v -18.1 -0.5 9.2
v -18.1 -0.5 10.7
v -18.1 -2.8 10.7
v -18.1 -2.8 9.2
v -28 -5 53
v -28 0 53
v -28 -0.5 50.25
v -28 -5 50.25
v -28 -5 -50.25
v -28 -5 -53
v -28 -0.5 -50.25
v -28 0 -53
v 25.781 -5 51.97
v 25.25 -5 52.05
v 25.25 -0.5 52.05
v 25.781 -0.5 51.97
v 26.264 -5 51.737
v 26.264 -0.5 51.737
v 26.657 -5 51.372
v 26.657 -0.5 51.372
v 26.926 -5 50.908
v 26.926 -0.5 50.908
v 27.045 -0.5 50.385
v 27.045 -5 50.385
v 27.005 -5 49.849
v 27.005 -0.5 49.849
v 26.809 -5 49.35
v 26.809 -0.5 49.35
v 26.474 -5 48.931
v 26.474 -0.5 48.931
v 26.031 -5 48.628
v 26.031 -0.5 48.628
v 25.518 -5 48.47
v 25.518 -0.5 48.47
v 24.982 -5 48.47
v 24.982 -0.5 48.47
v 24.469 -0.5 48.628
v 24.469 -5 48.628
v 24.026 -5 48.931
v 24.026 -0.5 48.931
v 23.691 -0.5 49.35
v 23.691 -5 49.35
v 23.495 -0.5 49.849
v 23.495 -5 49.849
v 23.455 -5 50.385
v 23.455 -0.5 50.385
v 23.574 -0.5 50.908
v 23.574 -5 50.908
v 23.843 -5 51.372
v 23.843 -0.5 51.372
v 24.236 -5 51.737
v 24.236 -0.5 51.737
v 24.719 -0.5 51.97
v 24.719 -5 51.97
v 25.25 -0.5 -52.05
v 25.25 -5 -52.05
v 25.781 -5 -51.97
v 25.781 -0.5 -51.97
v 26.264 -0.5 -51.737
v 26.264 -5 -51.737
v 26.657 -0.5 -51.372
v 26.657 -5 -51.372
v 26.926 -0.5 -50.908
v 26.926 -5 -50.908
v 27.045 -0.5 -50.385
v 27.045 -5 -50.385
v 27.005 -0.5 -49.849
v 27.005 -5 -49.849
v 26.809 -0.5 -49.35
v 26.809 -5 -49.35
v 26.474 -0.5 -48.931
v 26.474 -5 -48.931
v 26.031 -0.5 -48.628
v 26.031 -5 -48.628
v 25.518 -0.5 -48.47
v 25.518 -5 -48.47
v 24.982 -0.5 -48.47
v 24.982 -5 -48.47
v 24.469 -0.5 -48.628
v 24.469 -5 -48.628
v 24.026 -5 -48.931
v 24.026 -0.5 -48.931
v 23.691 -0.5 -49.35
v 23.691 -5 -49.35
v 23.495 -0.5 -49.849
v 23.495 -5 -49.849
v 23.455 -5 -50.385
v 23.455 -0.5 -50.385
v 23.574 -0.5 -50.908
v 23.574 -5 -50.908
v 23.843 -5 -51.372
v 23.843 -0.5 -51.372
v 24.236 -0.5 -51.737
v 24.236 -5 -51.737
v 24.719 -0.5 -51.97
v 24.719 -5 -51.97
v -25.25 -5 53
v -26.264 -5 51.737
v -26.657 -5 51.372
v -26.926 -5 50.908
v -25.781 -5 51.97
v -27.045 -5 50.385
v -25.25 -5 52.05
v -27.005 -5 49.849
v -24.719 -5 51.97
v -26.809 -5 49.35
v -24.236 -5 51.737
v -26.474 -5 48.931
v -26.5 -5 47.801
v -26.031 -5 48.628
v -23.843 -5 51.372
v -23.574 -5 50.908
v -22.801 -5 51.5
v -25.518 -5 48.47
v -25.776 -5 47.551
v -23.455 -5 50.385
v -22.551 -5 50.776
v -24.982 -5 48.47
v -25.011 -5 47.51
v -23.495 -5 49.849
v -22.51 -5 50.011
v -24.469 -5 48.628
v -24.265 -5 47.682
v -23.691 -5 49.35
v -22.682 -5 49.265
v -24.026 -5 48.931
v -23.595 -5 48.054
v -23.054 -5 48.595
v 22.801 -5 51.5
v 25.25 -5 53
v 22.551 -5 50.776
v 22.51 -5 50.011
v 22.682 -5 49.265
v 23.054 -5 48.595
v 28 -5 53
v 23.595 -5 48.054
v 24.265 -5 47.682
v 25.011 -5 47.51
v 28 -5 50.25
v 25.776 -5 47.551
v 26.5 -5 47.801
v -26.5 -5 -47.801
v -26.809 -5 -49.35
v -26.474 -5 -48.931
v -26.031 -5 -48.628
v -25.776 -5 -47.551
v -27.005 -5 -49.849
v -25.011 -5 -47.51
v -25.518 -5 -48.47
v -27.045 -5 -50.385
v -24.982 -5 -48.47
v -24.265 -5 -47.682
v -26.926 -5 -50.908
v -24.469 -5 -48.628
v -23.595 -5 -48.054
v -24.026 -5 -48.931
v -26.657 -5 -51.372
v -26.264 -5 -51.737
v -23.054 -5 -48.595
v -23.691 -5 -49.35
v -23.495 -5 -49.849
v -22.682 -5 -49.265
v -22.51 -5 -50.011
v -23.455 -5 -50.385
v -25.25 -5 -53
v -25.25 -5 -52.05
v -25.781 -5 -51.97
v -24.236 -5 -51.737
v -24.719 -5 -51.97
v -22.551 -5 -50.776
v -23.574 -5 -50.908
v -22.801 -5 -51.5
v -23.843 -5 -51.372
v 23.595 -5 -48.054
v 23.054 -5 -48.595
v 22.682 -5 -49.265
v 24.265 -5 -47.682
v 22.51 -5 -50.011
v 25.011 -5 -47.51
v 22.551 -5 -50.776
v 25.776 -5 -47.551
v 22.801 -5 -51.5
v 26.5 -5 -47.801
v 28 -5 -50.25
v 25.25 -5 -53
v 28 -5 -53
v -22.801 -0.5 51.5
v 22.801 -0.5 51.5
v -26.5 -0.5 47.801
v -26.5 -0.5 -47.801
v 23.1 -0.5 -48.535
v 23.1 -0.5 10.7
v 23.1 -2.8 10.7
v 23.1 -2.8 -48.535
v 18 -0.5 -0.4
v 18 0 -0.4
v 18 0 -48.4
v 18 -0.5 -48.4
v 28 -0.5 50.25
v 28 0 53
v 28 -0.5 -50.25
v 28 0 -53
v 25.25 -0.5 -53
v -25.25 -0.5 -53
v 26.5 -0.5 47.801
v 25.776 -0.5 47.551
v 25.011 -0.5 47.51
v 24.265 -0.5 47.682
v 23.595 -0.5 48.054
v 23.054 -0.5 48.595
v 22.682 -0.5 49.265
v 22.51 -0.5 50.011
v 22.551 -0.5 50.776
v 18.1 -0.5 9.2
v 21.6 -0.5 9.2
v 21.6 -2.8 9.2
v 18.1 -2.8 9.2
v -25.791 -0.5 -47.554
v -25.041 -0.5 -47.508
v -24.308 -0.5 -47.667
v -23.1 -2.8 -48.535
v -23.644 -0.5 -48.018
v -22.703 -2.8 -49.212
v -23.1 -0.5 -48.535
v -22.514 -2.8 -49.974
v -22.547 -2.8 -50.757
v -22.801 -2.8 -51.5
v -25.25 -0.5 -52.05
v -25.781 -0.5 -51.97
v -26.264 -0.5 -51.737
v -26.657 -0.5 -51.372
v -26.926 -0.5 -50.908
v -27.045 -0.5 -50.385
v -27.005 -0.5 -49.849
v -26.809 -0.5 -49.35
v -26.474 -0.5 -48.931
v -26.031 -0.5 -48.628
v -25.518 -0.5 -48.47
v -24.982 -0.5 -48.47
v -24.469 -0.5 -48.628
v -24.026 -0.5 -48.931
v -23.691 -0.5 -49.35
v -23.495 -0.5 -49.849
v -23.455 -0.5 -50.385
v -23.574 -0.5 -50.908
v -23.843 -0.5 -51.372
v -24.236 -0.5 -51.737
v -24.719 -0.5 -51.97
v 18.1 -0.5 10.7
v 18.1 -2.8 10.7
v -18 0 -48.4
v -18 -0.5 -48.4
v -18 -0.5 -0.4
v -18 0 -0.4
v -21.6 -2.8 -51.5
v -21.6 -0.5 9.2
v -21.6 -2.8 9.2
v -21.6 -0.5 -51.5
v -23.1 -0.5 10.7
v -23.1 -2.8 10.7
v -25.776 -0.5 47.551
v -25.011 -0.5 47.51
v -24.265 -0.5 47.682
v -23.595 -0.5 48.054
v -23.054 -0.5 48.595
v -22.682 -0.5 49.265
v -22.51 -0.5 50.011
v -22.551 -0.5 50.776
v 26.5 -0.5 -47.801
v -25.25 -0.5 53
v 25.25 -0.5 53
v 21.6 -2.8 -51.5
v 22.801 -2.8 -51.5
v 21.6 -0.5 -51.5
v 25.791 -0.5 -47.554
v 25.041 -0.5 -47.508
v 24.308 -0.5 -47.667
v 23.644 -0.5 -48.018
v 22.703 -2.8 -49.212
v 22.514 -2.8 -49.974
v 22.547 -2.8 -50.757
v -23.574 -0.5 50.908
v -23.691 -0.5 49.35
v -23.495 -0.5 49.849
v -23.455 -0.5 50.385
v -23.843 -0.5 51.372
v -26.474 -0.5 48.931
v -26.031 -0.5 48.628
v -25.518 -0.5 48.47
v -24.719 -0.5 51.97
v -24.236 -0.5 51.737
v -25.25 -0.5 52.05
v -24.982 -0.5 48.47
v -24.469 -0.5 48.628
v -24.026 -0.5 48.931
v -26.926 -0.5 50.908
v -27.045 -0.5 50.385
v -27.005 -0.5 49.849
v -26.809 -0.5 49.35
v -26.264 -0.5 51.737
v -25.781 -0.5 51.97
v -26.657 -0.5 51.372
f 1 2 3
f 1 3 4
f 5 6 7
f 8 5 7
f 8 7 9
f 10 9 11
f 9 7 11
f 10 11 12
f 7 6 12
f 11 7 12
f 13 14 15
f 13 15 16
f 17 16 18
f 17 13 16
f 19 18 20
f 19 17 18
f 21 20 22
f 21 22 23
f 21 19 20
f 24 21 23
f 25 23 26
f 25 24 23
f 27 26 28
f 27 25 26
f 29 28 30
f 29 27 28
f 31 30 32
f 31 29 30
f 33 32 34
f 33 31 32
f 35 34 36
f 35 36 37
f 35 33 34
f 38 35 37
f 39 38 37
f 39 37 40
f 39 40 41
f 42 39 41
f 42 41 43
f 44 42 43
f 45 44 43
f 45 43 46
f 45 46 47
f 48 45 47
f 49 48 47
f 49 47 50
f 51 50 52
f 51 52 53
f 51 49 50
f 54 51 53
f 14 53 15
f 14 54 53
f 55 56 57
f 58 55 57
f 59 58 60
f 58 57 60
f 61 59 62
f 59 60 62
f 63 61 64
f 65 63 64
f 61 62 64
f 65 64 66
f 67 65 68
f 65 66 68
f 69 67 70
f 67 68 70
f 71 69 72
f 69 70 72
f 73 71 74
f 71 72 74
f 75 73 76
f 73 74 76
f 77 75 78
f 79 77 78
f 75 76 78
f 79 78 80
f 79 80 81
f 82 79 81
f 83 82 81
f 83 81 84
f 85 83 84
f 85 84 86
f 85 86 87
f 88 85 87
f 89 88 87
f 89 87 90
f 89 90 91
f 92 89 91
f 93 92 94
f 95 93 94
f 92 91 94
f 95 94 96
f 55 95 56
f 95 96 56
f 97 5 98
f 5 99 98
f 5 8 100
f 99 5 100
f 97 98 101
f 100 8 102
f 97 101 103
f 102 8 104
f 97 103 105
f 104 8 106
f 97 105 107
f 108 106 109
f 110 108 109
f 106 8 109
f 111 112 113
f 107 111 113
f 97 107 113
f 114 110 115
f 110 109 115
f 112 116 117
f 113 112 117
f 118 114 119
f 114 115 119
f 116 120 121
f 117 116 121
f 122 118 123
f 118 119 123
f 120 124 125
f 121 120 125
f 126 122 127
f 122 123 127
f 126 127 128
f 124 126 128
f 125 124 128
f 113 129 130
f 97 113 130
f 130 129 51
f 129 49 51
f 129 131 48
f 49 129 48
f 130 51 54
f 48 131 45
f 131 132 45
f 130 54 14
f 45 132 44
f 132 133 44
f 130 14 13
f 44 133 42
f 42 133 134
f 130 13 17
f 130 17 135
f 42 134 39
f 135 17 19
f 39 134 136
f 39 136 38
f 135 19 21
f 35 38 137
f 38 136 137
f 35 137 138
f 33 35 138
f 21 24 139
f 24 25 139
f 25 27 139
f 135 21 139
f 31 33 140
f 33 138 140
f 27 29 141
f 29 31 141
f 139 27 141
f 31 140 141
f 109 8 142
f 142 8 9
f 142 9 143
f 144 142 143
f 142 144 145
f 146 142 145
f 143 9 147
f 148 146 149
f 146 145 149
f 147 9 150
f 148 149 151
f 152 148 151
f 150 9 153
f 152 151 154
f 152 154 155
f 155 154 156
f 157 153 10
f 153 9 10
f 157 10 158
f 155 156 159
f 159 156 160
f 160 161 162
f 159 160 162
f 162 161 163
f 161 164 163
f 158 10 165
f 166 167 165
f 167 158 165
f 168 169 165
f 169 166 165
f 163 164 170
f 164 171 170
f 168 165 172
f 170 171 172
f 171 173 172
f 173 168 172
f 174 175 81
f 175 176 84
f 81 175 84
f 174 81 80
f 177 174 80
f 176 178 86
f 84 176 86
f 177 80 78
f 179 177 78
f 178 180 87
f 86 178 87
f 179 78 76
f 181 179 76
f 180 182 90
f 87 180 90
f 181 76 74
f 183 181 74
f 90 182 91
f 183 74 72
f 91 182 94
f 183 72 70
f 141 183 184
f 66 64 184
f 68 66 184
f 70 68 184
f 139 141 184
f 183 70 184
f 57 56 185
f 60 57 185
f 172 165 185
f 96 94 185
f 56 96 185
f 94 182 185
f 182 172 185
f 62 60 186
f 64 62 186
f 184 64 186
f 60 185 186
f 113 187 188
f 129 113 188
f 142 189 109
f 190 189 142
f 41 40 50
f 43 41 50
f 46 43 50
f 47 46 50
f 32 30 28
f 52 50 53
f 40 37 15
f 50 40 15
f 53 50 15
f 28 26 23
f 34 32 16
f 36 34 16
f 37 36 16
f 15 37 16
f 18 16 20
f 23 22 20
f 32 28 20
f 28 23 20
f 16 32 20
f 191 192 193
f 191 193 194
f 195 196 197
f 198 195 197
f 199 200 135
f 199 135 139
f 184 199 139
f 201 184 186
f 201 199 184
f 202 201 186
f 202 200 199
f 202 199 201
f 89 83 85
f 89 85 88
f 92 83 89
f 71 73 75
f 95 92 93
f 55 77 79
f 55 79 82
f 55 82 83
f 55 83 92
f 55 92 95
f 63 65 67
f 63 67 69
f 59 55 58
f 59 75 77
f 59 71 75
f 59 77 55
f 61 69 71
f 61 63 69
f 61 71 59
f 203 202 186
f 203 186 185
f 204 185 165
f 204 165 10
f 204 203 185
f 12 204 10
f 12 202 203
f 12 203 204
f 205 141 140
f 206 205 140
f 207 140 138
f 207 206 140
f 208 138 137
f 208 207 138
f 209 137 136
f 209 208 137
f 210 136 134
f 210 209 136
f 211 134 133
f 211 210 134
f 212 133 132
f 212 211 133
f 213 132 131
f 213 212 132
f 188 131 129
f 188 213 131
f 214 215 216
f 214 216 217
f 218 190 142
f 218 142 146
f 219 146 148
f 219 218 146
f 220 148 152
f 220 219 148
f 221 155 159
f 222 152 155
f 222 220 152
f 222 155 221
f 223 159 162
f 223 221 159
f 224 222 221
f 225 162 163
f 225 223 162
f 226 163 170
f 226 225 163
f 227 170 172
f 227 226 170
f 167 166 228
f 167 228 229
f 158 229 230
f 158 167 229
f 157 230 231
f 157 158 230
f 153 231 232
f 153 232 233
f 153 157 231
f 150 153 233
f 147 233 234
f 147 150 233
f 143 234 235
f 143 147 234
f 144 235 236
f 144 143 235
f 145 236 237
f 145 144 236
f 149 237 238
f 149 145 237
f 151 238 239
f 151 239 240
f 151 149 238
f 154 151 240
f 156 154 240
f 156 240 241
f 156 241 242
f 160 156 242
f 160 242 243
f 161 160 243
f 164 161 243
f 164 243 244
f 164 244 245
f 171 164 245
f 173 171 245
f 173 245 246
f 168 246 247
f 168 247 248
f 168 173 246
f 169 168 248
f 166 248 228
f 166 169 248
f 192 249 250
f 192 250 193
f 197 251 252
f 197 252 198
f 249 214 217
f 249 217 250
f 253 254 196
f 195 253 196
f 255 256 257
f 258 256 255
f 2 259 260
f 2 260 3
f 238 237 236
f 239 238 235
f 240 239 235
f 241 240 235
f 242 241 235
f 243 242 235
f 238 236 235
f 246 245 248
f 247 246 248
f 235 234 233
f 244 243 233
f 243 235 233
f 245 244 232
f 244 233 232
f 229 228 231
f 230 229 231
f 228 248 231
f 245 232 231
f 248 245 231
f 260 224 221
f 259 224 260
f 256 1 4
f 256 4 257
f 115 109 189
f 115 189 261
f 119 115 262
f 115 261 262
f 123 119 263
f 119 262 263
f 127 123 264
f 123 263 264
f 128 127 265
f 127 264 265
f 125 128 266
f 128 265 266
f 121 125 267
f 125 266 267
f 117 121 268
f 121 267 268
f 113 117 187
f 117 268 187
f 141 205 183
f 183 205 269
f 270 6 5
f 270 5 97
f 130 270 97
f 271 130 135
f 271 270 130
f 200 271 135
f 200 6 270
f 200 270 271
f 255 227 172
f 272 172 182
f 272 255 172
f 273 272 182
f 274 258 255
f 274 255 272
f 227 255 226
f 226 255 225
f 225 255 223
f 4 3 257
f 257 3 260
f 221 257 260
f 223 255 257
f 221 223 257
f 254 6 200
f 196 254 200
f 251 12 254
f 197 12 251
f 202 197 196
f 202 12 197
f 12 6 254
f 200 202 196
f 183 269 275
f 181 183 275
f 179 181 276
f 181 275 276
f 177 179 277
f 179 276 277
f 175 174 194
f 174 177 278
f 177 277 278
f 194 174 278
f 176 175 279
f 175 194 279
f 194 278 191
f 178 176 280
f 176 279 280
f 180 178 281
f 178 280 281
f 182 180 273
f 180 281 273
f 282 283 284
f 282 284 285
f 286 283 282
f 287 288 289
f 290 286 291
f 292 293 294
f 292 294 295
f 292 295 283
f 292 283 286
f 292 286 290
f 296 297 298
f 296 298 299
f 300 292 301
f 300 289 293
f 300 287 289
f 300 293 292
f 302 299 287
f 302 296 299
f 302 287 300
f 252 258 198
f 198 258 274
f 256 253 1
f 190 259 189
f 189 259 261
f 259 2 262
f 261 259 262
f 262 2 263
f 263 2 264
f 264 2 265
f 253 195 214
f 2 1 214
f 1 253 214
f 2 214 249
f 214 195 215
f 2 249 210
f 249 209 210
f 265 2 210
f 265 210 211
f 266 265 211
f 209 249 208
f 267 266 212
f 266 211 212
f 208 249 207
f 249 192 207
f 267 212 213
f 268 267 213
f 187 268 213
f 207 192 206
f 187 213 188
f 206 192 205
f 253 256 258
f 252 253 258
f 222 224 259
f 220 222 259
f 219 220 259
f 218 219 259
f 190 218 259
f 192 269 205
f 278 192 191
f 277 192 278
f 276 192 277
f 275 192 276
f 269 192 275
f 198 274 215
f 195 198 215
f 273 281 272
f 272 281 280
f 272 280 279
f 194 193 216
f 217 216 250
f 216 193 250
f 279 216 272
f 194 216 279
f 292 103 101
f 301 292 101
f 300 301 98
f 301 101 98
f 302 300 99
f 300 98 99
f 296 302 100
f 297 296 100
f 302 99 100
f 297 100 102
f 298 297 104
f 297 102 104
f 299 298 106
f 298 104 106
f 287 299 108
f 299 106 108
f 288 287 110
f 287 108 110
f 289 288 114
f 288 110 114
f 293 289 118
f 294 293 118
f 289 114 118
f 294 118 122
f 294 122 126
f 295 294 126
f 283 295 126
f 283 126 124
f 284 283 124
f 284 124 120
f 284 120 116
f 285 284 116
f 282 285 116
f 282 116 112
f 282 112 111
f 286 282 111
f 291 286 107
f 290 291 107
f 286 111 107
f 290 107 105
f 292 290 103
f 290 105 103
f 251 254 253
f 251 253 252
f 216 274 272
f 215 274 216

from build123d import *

# Parameters (mm, degrees)
SKETCH1_W                 = 56
SKETCH1_H                 = 106
BOSS_EXTRUDE1_DEPTH       = 5
SHELL1_T                  = -1.5
SHELL1_THICKNESS_2_FACE_W = 103
SHELL1_THICKNESS_2_FACE_H = 53
SHELL1_THICKNESS_2_DEPTH  = 1
SKETCH2_W                 = 36
SKETCH2_H                 = 48
CUT_EXTRUDE1_DEPTH        = 61.149812967
BOSS_EXTRUDE2_DEPTH       = 2.3
SKETCH4_R                 = 2.75
BOSS_EXTRUDE3_DEPTH       = 4.5
SKETCH5_R                 = 1.8
CUT_EXTRUDE2_DEPTH        = 4.5
MIRROR2_COPY_1_SKETCH_R   = 2.75
MIRROR2_COPY_1_DEPTH      = 4.5
MIRROR2_COPY_2_SKETCH_R   = 1.8
MIRROR2_COPY_2_DEPTH      = 4.5


with BuildPart() as part:
    # Sketch1 → Boss-Extrude1 (new body)
    with BuildSketch(Plane(origin=(0, 0, 0), x_dir=(1, 0, 0), z_dir=(0, 1, 0))):
        Rectangle(SKETCH1_W, SKETCH1_H)
    extrude(amount=-BOSS_EXTRUDE1_DEPTH)

    # Shell1
    shell1_openings = [part.faces().sort_by_distance(p)[0] for p in [
        (0, -5, 0),
    ]]
    offset(amount=SHELL1_T, openings=shell1_openings, kind=Kind.INTERSECTION)

    # Shell1 thickness 2 face (on inner face of the shell) → Shell1 thickness 2 (cut)
    with BuildSketch(Plane.ZX.offset(-1.5)):
        Rectangle(SHELL1_THICKNESS_2_FACE_W, SHELL1_THICKNESS_2_FACE_H)
    extrude(amount=SHELL1_THICKNESS_2_DEPTH, mode=Mode.SUBTRACT)

    # Sketch2 → Cut-Extrude1 (cut, through all)
    with BuildSketch(Plane(origin=(0, 0, 0), x_dir=(1, 0, 0), z_dir=(0, 1, 0))):
        with Locations((0, 24.4)):
            Rectangle(SKETCH2_W, SKETCH2_H)
    extrude(amount=-CUT_EXTRUDE1_DEPTH, mode=Mode.SUBTRACT)

    # Sketch3 → Boss-Extrude2 (add)
    with BuildSketch(Plane.XZ.offset(0.5)):
        Polygon((-21.6, -51.5), (21.6, -51.5), (21.6, 9.2), (18.1, 9.2), (18.1, 10.7), (23.1, 10.7), (23.1, -53), (-23.1, -53), (-23.1, 10.7), (-18.1, 10.7), (-18.1, 9.2), (-21.6, 9.2), align=None)
    extrude(amount=BOSS_EXTRUDE2_DEPTH)

    # Sketch4 → Boss-Extrude3 (add)
    with BuildSketch(Plane.XZ.offset(0.5)):
        with Locations((25.25, -50.25)):
            Circle(SKETCH4_R)
    boss_extrude3 = extrude(amount=BOSS_EXTRUDE3_DEPTH)

    # Sketch5 → Cut-Extrude2 (cut)
    with BuildSketch(Plane.XZ.offset(5)):
        with Locations(Location((25.25, -50.25, 0), (0, 0, 270))):
            Circle(SKETCH5_R)
    cut_extrude2 = extrude(amount=-CUT_EXTRUDE2_DEPTH, mode=Mode.SUBTRACT)

    # Mirror1: Boss-Extrude3, Cut-Extrude2 across plane
    add(boss_extrude3.mirror(Plane.XY))
    add(cut_extrude2.mirror(Plane.XY), mode=Mode.SUBTRACT)

    # Mirror2: Boss-Extrude3, Cut-Extrude2 across plane
    add(boss_extrude3.mirror(Plane(origin=(0, 0, 0), x_dir=(0, 0, 1), z_dir=(1, 0, 0))))
    add(cut_extrude2.mirror(Plane(origin=(0, 0, 0), x_dir=(0, 0, 1), z_dir=(1, 0, 0))), mode=Mode.SUBTRACT)

    # Mirror2 copy 1 sketch → Mirror2 copy 1 (add)
    with BuildSketch(Plane(origin=(0, -0.5, 0), x_dir=(-1, 0, 0), z_dir=(0, -1, 0))):
        with Locations((25.25, -50.25)):
            Circle(MIRROR2_COPY_1_SKETCH_R)
    extrude(amount=MIRROR2_COPY_1_DEPTH)

    # Mirror2 copy 2 sketch → Mirror2 copy 2 (cut)
    with BuildSketch(Plane(origin=(0, -5, 0), x_dir=(-1, 0, 0), z_dir=(0, -1, 0))):
        with Locations(Location((25.25, -50.25, 0), (0, 0, 270))):
            Circle(MIRROR2_COPY_2_SKETCH_R)
    extrude(amount=-MIRROR2_COPY_2_DEPTH, mode=Mode.SUBTRACT)


solid = part.part
